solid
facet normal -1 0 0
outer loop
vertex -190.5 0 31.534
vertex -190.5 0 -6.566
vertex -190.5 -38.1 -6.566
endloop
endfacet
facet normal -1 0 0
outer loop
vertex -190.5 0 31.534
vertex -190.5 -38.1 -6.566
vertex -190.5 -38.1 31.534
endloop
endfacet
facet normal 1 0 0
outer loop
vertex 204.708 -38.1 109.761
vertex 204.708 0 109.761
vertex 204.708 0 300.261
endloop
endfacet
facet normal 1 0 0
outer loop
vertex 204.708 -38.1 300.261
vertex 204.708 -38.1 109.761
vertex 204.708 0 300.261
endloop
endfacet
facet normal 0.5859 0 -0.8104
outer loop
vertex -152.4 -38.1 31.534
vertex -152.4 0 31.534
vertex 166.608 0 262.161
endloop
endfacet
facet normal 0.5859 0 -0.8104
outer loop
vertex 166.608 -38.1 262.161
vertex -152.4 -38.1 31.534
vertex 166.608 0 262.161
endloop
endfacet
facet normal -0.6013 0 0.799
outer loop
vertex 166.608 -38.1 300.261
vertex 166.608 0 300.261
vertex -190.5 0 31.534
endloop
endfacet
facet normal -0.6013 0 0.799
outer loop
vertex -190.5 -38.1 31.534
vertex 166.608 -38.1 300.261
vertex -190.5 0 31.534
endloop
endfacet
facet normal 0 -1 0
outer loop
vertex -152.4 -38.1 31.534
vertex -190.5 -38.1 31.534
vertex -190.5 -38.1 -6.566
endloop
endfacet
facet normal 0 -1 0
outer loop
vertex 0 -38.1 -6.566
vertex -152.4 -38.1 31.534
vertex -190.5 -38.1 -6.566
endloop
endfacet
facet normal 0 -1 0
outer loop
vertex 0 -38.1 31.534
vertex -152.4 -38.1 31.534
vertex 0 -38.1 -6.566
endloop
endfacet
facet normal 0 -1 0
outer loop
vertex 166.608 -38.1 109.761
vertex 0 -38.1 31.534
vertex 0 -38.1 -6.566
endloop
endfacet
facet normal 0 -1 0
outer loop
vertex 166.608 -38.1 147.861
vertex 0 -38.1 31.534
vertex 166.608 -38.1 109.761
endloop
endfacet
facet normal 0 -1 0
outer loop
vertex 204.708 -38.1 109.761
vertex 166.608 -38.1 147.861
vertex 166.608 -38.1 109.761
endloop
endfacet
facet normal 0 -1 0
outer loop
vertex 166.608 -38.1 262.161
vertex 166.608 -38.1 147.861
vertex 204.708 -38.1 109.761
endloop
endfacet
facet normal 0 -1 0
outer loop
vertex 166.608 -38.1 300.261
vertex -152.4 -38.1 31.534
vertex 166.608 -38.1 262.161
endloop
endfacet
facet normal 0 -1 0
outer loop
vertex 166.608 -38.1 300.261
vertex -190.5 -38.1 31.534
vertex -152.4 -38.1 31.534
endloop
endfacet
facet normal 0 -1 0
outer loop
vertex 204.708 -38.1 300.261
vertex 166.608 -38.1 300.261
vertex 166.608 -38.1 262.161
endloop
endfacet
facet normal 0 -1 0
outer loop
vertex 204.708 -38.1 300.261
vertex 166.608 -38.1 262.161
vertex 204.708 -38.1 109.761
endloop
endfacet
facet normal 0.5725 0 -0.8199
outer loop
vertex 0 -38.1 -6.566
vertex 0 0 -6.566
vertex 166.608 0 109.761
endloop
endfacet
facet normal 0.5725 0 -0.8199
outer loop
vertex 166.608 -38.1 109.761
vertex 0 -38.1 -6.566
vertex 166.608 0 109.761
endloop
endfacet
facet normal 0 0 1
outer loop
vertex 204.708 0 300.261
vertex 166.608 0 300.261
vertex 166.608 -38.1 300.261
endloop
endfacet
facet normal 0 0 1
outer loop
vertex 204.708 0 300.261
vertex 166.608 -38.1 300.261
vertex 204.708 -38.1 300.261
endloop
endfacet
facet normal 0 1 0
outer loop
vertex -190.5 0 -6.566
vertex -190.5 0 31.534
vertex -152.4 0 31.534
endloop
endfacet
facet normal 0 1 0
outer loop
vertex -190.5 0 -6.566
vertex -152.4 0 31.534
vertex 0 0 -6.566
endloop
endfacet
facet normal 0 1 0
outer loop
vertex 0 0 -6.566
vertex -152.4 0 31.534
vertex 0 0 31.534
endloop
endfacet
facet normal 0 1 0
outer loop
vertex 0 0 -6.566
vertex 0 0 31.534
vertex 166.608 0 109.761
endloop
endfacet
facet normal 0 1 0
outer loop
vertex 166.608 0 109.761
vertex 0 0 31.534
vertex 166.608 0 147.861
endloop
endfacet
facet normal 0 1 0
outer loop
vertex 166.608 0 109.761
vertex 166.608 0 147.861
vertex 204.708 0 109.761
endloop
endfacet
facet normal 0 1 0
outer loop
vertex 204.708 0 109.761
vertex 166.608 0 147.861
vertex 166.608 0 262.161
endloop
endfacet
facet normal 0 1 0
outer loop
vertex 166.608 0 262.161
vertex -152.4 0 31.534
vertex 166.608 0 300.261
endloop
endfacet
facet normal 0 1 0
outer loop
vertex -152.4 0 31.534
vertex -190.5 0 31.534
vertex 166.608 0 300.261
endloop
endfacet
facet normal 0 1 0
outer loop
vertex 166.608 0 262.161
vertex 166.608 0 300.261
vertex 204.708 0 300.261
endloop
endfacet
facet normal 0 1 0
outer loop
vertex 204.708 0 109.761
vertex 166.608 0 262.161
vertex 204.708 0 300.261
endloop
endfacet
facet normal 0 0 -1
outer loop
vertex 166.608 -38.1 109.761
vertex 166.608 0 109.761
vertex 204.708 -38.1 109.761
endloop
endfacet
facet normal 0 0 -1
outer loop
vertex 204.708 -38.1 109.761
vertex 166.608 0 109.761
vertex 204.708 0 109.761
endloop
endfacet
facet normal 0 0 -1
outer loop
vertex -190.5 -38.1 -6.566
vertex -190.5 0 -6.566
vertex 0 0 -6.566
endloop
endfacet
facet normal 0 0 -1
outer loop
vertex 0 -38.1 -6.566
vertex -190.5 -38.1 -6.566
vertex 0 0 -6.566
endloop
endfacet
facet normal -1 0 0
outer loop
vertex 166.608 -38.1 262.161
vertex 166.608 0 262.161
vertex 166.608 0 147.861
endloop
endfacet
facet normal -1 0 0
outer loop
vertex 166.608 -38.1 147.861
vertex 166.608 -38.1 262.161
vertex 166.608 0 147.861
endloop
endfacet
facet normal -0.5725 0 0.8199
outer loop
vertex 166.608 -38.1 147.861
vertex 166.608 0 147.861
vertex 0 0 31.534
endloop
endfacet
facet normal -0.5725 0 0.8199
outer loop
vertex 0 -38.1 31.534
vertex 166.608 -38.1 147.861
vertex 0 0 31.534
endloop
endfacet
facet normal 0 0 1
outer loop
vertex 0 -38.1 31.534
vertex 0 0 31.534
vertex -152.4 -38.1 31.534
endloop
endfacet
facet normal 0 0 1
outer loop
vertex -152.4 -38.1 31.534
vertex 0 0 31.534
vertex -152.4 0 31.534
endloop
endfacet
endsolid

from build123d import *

# Parameters (mm, degrees)
F1_DEPTH = 38.1
F0_W     = 152.4
F0_H     = 38.1
F0_W_2   = 38.1
F2_DEPTH = 38.1


with BuildPart() as f1:
    # F0 (on Front) → F1 (new body)
    with BuildSketch(Plane.XZ):
        Polygon((-190.5, 31.534294), (-152.4, 31.534294), (166.608291, 262.161064), (166.608291, 300.261064), align=None)
    extrude(amount=F1_DEPTH)

    # F0 (on Front) → F2 (join)
    with BuildSketch(Plane.XZ):
        with Locations((-76.2, 12.484294)):
            Rectangle(F0_W, F0_H)
        with Locations((-171.45, 12.484294)):
            Rectangle(F0_W_2, F0_H)
        Polygon((0, 31.534294), (0, -6.565706), (166.608291, 109.761064), (166.608291, 147.861064), align=None)
        Polygon((-190.5, 31.534294), (-152.4, 31.534294), (166.608291, 262.161064), (166.608291, 300.261064), align=None)
        Polygon((166.608291, 147.861064), (166.608291, 109.761064), (204.708291, 109.761064), (204.708291, 262.161064), (166.608291, 262.161064), align=None)
        with Locations((185.658291, 281.211064)):
            Rectangle(F0_W_2, F0_H)
    extrude(amount=F2_DEPTH)


solid = f1.part
